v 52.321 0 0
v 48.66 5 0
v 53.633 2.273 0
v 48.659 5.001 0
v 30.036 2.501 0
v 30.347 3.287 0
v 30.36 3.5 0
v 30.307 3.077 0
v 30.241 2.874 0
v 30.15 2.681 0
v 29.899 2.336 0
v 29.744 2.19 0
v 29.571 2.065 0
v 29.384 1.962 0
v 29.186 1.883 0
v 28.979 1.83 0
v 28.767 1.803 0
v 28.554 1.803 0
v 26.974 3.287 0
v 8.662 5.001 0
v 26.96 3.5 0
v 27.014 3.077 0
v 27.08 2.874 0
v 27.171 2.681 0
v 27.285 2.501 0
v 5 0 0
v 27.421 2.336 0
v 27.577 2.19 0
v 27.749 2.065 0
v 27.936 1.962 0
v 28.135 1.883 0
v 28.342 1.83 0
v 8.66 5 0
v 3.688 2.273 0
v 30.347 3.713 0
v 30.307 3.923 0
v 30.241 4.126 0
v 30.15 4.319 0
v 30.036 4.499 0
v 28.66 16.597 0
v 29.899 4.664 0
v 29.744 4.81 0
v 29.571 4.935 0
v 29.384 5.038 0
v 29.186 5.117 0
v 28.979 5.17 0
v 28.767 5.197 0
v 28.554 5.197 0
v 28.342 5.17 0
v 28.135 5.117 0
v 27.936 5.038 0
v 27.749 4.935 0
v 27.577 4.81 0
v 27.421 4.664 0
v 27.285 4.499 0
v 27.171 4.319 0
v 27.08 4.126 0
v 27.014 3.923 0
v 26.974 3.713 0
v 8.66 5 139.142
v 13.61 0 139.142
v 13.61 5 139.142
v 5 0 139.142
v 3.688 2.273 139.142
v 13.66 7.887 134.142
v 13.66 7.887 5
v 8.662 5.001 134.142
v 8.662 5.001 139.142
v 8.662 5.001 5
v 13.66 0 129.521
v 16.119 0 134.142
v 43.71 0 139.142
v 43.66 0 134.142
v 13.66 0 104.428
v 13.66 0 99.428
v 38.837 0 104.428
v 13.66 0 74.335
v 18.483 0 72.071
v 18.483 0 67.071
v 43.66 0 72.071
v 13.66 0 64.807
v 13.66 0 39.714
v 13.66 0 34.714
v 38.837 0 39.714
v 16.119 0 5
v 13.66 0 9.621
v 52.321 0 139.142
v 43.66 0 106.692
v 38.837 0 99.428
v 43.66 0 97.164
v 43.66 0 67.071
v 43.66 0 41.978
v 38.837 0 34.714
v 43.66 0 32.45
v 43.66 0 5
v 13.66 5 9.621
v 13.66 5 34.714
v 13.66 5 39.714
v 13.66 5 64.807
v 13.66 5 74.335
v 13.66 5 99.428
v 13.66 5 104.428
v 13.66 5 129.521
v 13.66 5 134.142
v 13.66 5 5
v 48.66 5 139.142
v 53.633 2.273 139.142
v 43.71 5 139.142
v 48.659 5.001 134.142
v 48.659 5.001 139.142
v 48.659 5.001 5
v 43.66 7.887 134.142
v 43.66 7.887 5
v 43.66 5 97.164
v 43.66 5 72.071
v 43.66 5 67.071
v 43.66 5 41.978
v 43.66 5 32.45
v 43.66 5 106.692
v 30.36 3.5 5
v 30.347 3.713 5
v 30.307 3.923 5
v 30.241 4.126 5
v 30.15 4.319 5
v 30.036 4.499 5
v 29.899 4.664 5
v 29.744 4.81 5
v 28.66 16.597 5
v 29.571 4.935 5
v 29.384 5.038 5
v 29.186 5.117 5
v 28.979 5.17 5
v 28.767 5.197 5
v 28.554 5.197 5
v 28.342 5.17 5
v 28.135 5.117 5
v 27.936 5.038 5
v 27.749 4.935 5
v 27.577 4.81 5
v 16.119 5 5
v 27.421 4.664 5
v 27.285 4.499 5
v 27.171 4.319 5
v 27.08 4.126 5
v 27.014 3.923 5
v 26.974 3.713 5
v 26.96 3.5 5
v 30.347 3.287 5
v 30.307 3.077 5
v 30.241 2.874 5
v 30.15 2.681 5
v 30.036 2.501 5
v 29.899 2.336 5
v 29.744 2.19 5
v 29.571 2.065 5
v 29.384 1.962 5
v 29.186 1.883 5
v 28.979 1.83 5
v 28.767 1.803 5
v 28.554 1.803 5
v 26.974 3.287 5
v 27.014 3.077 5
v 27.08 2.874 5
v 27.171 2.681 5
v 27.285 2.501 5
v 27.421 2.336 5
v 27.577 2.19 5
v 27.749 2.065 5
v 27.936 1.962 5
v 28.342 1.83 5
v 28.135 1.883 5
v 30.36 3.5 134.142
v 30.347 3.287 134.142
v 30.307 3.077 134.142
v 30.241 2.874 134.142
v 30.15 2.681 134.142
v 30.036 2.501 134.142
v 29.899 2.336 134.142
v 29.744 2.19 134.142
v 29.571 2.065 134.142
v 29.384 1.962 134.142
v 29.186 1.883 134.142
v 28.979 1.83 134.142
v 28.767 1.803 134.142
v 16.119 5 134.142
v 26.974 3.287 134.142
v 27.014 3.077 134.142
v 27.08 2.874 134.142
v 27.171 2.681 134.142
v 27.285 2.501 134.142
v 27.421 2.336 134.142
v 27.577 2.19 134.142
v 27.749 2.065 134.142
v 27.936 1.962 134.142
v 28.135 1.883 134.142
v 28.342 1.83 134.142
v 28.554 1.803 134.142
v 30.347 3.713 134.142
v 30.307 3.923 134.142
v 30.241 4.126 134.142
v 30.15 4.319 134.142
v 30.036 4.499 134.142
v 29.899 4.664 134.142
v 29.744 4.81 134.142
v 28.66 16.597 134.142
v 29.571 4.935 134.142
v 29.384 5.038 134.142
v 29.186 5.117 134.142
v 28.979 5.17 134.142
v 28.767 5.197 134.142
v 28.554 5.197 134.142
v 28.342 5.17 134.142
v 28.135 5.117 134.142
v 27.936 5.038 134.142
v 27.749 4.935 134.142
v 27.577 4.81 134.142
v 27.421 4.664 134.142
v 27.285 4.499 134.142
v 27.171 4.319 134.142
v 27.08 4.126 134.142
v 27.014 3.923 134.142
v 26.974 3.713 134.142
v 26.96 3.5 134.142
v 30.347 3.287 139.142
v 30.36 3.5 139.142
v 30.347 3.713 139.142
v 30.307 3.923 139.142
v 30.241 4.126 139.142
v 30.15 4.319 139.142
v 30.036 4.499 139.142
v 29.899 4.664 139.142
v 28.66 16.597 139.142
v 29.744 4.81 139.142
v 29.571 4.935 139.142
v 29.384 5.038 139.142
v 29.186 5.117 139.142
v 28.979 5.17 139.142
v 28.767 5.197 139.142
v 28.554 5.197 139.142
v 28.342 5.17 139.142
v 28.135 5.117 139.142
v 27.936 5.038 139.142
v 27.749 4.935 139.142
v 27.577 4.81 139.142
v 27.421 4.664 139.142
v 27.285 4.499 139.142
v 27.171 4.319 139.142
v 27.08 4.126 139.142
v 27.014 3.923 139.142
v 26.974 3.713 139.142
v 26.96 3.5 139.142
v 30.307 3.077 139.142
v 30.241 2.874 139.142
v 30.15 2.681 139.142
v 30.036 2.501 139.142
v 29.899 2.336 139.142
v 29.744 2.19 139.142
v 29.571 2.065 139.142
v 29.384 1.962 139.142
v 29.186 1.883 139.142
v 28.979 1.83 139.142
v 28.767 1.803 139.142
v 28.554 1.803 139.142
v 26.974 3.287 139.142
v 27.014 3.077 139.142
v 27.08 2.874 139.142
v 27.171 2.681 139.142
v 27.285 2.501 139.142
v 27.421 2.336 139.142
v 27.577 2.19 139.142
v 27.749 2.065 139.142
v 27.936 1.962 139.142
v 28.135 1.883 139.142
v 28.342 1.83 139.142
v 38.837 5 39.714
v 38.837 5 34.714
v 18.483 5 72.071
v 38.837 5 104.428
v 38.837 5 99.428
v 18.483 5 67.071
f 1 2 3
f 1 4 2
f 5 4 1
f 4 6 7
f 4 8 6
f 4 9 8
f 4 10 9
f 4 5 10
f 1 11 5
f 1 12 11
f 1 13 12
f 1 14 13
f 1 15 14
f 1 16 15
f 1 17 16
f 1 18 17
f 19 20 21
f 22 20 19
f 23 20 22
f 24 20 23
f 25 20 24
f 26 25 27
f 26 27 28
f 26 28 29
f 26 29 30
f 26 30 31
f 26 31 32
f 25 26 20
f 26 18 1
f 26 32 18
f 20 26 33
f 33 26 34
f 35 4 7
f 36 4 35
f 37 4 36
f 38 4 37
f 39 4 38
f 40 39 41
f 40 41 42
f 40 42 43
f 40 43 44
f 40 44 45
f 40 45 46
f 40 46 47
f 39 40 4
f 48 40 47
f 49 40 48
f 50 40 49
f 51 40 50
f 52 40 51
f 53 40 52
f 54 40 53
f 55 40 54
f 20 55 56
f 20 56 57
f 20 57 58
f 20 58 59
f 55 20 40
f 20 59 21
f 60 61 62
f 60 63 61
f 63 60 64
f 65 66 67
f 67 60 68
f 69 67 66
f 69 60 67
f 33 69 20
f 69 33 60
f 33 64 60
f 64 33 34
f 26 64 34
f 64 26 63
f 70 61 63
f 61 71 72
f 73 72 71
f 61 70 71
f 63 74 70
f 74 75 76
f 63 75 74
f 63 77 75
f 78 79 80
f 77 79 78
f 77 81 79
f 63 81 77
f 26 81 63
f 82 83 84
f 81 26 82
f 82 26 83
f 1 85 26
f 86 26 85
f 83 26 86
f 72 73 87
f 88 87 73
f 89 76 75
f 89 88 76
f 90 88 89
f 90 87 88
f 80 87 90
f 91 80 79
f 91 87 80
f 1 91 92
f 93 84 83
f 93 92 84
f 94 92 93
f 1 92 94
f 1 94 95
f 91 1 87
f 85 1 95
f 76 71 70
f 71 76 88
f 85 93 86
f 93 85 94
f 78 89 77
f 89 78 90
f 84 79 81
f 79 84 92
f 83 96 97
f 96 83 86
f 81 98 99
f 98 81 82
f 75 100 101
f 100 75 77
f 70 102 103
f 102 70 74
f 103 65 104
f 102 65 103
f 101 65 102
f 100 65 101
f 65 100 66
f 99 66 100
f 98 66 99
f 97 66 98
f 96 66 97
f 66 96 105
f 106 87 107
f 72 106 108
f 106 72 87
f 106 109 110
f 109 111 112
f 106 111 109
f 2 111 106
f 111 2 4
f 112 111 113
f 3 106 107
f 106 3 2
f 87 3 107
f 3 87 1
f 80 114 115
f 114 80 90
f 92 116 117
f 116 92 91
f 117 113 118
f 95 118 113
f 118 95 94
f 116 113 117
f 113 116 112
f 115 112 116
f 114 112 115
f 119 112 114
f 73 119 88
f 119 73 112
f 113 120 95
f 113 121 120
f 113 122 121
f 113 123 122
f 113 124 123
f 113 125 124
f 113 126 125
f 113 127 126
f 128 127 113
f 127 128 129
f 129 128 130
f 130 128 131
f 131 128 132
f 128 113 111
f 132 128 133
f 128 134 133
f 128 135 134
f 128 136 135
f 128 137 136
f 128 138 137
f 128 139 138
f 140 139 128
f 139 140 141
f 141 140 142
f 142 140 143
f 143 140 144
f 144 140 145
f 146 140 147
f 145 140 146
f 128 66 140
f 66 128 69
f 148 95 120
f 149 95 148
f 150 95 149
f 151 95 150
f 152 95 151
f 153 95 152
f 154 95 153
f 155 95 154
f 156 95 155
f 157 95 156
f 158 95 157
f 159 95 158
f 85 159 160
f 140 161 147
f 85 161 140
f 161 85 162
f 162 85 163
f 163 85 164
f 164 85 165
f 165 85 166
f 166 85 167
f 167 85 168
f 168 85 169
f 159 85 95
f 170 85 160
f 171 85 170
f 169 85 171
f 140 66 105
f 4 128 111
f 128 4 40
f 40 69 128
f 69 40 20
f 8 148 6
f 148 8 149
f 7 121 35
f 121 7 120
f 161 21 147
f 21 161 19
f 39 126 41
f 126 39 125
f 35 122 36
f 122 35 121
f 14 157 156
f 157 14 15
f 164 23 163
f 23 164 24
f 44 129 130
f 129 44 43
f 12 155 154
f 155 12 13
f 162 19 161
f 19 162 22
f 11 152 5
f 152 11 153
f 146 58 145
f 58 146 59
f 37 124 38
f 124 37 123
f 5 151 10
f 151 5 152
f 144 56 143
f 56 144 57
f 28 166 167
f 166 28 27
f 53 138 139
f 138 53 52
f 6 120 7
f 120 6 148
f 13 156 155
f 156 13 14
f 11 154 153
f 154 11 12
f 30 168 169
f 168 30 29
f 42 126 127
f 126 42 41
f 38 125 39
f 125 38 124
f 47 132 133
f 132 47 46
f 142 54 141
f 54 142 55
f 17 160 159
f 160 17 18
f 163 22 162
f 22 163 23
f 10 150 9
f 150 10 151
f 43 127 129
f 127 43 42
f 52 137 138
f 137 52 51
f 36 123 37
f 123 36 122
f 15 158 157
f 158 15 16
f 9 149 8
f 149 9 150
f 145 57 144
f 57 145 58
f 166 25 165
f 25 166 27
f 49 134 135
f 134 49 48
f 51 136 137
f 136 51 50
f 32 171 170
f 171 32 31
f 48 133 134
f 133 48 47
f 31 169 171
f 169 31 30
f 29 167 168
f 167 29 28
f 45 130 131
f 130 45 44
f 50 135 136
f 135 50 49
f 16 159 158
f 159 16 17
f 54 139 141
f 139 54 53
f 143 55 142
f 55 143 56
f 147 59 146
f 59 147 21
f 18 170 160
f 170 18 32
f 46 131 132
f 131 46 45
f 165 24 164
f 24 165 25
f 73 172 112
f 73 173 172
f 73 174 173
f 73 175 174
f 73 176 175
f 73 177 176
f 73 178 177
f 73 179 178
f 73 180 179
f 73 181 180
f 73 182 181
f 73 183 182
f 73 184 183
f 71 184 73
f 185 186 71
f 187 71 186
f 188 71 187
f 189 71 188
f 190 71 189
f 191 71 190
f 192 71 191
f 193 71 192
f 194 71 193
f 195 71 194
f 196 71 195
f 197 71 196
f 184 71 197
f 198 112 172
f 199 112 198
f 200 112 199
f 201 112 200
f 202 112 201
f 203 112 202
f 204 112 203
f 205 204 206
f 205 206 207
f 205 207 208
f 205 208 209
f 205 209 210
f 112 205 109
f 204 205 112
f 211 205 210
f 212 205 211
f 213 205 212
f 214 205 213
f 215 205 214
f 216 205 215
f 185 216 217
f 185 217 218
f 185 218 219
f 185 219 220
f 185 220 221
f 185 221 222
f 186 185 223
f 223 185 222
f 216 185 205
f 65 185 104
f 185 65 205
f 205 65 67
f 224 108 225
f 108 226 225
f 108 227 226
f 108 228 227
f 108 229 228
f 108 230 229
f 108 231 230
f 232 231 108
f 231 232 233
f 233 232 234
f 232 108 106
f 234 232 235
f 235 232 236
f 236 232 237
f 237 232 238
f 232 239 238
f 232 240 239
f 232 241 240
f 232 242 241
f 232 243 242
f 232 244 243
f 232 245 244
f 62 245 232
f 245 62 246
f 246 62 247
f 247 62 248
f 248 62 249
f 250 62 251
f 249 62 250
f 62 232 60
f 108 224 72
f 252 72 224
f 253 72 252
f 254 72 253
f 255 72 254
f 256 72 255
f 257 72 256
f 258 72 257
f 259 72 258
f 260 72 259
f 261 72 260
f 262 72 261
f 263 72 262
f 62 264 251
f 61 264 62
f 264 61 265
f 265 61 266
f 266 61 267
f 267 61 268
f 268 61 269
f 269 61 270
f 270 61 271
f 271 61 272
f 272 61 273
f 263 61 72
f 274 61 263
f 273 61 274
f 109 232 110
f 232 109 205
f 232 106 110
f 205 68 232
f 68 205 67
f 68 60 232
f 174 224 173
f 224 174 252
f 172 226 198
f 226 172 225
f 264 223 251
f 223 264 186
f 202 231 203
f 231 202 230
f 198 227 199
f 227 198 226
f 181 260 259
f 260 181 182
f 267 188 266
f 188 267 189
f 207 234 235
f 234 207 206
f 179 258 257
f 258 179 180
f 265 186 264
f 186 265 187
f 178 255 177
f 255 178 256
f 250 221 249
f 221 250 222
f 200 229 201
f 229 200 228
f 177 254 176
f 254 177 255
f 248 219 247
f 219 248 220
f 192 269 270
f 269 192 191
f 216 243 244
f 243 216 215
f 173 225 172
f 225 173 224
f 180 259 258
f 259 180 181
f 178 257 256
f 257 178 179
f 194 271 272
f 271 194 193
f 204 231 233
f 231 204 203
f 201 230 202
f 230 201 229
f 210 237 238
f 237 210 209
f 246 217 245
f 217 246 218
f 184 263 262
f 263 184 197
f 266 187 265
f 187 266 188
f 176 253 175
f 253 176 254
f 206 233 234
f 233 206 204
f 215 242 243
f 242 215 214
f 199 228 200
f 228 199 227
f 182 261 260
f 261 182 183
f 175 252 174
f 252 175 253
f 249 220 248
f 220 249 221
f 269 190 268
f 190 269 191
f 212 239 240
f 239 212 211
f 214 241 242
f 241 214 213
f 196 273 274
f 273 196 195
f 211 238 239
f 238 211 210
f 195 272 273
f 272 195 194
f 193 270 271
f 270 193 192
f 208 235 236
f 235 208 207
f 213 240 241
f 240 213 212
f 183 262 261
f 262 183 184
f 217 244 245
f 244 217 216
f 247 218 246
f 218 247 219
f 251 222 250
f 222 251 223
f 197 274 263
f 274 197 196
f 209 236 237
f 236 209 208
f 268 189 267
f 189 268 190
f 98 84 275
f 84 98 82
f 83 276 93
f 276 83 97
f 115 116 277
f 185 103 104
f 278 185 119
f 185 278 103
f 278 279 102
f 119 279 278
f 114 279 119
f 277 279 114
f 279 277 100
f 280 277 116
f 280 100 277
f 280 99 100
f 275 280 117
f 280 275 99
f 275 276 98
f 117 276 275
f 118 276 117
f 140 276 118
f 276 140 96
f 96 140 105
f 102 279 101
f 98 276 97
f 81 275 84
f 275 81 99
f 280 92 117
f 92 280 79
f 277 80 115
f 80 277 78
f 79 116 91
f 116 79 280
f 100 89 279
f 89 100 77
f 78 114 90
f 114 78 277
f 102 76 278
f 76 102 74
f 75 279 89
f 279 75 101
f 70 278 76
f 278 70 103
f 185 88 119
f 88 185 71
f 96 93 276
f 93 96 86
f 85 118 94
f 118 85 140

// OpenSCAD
// file: triangle_truss.scad
module truss_edge_beam(beam_width, edge_extrude, total_length)
{
  edge_width = beam_width * tan(60);
  edge_bevel = beam_width / (2 * cos(60));
  bevel_x = edge_bevel - (1 + $epsilon) * beam_width * cos(60) / 2;
  bevel_y = (1 + $epsilon) * beam_width * sin(60) / 2;
  linear_extrude(height = total_length)
  {
    polygon([[edge_bevel, 0], [edge_width + edge_extrude, 0],
        [edge_width + edge_extrude, beam_width + tan(30) * edge_extrude],
        [edge_width, beam_width], [bevel_x, bevel_y]]);
  }
  echo("Main bean height:", beam_width + tan(30) * edge_extrude, "mm");
}

module truss_main_beams(beam_width, edge_extrude, inner_width, total_length)
{
  edge_width = beam_width * tan(60);
  union()
  {
    truss_edge_beam(beam_width, edge_extrude, total_length);
    translate([2*(edge_width+edge_extrude) + inner_width, 0, 0])
    {
      mirror([1, 0, 0])
      {
        truss_edge_beam(beam_width, edge_extrude, total_length);
      }
    }
  }
}

module truss_end_triangle(beam_width, edge_extrude, inner_width, screw_d, screw_position)
{
  difference()
  {
    linear_extrude(height = beam_width)
    {
      polygon([[-$epsilon, 0], [inner_width + $epsilon, 0], [inner_width + $epsilon, beam_width],
               [inner_width + edge_extrude, beam_width],
               [inner_width/2, beam_width + sqrt(3)*(inner_width + 2*edge_extrude)/6 + $epsilon], 
               [-edge_extrude, beam_width], [-$epsilon, beam_width]]);
    }

    if (screw_position == 0)
    {
      translate([inner_width - (2 + screw_d/2), 2 + screw_d/2, -$epsilon])
      {
        cylinder(h=beam_width + 2*$epsilon, r=(screw_d/2 + $padding), center=false);
      }
    }
    else
    {
      translate([inner_width/2, 2 + screw_d/2, -$epsilon])
      {
        cylinder(h=beam_width + 2*$epsilon, r=(screw_d/2 + $padding), center=false);
      }
    }
  }
}

module truss_sweep(beam_width, edge_extrude, inner_width, num_inner_beams, inner_beam_angle, top)
{
  inner_beam_length = inner_width / tan(inner_beam_angle);
  inner_beam_offset = beam_width / sin(inner_beam_angle);
  total_length = beam_width + num_inner_beams*inner_beam_length +
                 inner_beam_offset + (num_inner_beams - 1)*inner_beam_offset/3;

  for (i = [0 : 1.0: num_inner_beams - 1])
  {
    translate([0, beam_width, beam_width/2 + i*(inner_beam_length+inner_beam_offset/3)])
    {
      union()
      {
        if (top == 1 && i > 0)
        {
          translate([-$epsilon, -beam_width, inner_beam_offset/3 - beam_width/2])
          cube([inner_width + 2*$epsilon, beam_width, beam_width]);
        }
        if (i % 2 == 0)
        {
          rotate([90, 0, 0])
          {
            linear_extrude(height=beam_width)
            {
              polygon([[-$epsilon, 0], [inner_width + $epsilon, inner_beam_length],
                       [inner_width + $epsilon, inner_beam_length + inner_beam_offset],
                       [-$epsilon, inner_beam_offset]]);
            }
          }
        }
        else
        {
          rotate([90, 0, 0])
          {
            linear_extrude(height=beam_width)
            {
              polygon([[inner_width + $epsilon, 0], [-$epsilon, inner_beam_length],
                       [-$epsilon, inner_beam_length + inner_beam_offset],
                       [inner_width + $epsilon, inner_beam_offset]]);
            }
          }
        }
      }
    }
  }
}

module triangle_truss_face(beam_width, edge_extrude, num_inner_beams, inner_beam_angle, inner_width, screw_d, screw_position, top)
{
  edge_width = beam_width * tan(60);
  inner_beam_length = inner_width / tan(inner_beam_angle);
  inner_beam_offset = beam_width / sin(inner_beam_angle);

  total_length = beam_width + num_inner_beams*inner_beam_length +
                 inner_beam_offset + (num_inner_beams - 1)*inner_beam_offset/3;
  union()
  {
    truss_main_beams(beam_width, edge_extrude, inner_width, total_length);

    translate([edge_width + edge_extrude, 0, 0])
    {
      union()
      {
        truss_end_triangle(beam_width, edge_extrude, inner_width, screw_d, screw_position);
        translate([0, 0, total_length - beam_width])
        {
          truss_end_triangle(beam_width, edge_extrude, inner_width, screw_d, screw_position);
        }

        truss_sweep(beam_width, edge_extrude, inner_width, num_inner_beams, inner_beam_angle, top);
      }
    }
  }
}

module triangle_truss(beam_width, edge_extrude, num_inner_beams, inner_beam_angle, inner_width, screw_d, screw_position)
{
  edge_width = beam_width * tan(60);
  total_width = 2*(edge_width+edge_extrude) + inner_width;

  union()
  {
    triangle_truss_face(beam_width, edge_extrude, num_inner_beams, inner_beam_angle, inner_width, screw_d, screw_position, 1);

    translate([total_width, 0, 0])
    {
      rotate([0, 0, 120])
      {
        triangle_truss_face(beam_width, edge_extrude, num_inner_beams, inner_beam_angle, inner_width, screw_d, screw_position, 1);
      }
    }

    rotate([0, 0, -120])
    {
      mirror([1, 0, 0])
      translate([0, 0, 0])
      {
        triangle_truss_face(beam_width, edge_extrude, num_inner_beams, inner_beam_angle, inner_width, screw_d, screw_position, 1);
      }
    }
  }
}

module triangle_truss_dims(beam_width, edge_extrude, num_inner_beams, inner_beam_angle, inner_width)
{
  inner_beam_length = inner_width / tan(inner_beam_angle);
  inner_beam_offset = beam_width / sin(inner_beam_angle);

  total_length = beam_width + num_inner_beams*inner_beam_length +
                 inner_beam_offset + (num_inner_beams - 1)*inner_beam_offset/3;

  edge_width = beam_width * tan(60);
  edge_bevel = beam_width / (2 * cos(60));
  bevel_x = edge_bevel - beam_width * cos(60);

  total_width = 2*(edge_width - edge_bevel + bevel_x) +
                2*edge_extrude + inner_width;

  echo("Truss length: ", total_length, " mm");
  echo("Truss width: ", total_width, " mm");
}
// main file
$fn = 50;
$epsilon = 0.05;
$padding = 0.2;

use <triangle_truss.scad>

// triangle_truss(beam_width, edge_extrude, num_inner_beams, inner_beam_angle, inner_width);

beam_width = 5;
edge_extrude = 5;
num_inner_beams = 4;
inner_beam_angle = 45;
inner_width = 30;
screw_d = 3;
screw_position = 1;

triangle_truss_face(beam_width, edge_extrude, num_inner_beams, inner_beam_angle, inner_width, screw_d, screw_position, 1);
triangle_truss_dims(beam_width, edge_extrude, num_inner_beams, inner_beam_angle, inner_width);
